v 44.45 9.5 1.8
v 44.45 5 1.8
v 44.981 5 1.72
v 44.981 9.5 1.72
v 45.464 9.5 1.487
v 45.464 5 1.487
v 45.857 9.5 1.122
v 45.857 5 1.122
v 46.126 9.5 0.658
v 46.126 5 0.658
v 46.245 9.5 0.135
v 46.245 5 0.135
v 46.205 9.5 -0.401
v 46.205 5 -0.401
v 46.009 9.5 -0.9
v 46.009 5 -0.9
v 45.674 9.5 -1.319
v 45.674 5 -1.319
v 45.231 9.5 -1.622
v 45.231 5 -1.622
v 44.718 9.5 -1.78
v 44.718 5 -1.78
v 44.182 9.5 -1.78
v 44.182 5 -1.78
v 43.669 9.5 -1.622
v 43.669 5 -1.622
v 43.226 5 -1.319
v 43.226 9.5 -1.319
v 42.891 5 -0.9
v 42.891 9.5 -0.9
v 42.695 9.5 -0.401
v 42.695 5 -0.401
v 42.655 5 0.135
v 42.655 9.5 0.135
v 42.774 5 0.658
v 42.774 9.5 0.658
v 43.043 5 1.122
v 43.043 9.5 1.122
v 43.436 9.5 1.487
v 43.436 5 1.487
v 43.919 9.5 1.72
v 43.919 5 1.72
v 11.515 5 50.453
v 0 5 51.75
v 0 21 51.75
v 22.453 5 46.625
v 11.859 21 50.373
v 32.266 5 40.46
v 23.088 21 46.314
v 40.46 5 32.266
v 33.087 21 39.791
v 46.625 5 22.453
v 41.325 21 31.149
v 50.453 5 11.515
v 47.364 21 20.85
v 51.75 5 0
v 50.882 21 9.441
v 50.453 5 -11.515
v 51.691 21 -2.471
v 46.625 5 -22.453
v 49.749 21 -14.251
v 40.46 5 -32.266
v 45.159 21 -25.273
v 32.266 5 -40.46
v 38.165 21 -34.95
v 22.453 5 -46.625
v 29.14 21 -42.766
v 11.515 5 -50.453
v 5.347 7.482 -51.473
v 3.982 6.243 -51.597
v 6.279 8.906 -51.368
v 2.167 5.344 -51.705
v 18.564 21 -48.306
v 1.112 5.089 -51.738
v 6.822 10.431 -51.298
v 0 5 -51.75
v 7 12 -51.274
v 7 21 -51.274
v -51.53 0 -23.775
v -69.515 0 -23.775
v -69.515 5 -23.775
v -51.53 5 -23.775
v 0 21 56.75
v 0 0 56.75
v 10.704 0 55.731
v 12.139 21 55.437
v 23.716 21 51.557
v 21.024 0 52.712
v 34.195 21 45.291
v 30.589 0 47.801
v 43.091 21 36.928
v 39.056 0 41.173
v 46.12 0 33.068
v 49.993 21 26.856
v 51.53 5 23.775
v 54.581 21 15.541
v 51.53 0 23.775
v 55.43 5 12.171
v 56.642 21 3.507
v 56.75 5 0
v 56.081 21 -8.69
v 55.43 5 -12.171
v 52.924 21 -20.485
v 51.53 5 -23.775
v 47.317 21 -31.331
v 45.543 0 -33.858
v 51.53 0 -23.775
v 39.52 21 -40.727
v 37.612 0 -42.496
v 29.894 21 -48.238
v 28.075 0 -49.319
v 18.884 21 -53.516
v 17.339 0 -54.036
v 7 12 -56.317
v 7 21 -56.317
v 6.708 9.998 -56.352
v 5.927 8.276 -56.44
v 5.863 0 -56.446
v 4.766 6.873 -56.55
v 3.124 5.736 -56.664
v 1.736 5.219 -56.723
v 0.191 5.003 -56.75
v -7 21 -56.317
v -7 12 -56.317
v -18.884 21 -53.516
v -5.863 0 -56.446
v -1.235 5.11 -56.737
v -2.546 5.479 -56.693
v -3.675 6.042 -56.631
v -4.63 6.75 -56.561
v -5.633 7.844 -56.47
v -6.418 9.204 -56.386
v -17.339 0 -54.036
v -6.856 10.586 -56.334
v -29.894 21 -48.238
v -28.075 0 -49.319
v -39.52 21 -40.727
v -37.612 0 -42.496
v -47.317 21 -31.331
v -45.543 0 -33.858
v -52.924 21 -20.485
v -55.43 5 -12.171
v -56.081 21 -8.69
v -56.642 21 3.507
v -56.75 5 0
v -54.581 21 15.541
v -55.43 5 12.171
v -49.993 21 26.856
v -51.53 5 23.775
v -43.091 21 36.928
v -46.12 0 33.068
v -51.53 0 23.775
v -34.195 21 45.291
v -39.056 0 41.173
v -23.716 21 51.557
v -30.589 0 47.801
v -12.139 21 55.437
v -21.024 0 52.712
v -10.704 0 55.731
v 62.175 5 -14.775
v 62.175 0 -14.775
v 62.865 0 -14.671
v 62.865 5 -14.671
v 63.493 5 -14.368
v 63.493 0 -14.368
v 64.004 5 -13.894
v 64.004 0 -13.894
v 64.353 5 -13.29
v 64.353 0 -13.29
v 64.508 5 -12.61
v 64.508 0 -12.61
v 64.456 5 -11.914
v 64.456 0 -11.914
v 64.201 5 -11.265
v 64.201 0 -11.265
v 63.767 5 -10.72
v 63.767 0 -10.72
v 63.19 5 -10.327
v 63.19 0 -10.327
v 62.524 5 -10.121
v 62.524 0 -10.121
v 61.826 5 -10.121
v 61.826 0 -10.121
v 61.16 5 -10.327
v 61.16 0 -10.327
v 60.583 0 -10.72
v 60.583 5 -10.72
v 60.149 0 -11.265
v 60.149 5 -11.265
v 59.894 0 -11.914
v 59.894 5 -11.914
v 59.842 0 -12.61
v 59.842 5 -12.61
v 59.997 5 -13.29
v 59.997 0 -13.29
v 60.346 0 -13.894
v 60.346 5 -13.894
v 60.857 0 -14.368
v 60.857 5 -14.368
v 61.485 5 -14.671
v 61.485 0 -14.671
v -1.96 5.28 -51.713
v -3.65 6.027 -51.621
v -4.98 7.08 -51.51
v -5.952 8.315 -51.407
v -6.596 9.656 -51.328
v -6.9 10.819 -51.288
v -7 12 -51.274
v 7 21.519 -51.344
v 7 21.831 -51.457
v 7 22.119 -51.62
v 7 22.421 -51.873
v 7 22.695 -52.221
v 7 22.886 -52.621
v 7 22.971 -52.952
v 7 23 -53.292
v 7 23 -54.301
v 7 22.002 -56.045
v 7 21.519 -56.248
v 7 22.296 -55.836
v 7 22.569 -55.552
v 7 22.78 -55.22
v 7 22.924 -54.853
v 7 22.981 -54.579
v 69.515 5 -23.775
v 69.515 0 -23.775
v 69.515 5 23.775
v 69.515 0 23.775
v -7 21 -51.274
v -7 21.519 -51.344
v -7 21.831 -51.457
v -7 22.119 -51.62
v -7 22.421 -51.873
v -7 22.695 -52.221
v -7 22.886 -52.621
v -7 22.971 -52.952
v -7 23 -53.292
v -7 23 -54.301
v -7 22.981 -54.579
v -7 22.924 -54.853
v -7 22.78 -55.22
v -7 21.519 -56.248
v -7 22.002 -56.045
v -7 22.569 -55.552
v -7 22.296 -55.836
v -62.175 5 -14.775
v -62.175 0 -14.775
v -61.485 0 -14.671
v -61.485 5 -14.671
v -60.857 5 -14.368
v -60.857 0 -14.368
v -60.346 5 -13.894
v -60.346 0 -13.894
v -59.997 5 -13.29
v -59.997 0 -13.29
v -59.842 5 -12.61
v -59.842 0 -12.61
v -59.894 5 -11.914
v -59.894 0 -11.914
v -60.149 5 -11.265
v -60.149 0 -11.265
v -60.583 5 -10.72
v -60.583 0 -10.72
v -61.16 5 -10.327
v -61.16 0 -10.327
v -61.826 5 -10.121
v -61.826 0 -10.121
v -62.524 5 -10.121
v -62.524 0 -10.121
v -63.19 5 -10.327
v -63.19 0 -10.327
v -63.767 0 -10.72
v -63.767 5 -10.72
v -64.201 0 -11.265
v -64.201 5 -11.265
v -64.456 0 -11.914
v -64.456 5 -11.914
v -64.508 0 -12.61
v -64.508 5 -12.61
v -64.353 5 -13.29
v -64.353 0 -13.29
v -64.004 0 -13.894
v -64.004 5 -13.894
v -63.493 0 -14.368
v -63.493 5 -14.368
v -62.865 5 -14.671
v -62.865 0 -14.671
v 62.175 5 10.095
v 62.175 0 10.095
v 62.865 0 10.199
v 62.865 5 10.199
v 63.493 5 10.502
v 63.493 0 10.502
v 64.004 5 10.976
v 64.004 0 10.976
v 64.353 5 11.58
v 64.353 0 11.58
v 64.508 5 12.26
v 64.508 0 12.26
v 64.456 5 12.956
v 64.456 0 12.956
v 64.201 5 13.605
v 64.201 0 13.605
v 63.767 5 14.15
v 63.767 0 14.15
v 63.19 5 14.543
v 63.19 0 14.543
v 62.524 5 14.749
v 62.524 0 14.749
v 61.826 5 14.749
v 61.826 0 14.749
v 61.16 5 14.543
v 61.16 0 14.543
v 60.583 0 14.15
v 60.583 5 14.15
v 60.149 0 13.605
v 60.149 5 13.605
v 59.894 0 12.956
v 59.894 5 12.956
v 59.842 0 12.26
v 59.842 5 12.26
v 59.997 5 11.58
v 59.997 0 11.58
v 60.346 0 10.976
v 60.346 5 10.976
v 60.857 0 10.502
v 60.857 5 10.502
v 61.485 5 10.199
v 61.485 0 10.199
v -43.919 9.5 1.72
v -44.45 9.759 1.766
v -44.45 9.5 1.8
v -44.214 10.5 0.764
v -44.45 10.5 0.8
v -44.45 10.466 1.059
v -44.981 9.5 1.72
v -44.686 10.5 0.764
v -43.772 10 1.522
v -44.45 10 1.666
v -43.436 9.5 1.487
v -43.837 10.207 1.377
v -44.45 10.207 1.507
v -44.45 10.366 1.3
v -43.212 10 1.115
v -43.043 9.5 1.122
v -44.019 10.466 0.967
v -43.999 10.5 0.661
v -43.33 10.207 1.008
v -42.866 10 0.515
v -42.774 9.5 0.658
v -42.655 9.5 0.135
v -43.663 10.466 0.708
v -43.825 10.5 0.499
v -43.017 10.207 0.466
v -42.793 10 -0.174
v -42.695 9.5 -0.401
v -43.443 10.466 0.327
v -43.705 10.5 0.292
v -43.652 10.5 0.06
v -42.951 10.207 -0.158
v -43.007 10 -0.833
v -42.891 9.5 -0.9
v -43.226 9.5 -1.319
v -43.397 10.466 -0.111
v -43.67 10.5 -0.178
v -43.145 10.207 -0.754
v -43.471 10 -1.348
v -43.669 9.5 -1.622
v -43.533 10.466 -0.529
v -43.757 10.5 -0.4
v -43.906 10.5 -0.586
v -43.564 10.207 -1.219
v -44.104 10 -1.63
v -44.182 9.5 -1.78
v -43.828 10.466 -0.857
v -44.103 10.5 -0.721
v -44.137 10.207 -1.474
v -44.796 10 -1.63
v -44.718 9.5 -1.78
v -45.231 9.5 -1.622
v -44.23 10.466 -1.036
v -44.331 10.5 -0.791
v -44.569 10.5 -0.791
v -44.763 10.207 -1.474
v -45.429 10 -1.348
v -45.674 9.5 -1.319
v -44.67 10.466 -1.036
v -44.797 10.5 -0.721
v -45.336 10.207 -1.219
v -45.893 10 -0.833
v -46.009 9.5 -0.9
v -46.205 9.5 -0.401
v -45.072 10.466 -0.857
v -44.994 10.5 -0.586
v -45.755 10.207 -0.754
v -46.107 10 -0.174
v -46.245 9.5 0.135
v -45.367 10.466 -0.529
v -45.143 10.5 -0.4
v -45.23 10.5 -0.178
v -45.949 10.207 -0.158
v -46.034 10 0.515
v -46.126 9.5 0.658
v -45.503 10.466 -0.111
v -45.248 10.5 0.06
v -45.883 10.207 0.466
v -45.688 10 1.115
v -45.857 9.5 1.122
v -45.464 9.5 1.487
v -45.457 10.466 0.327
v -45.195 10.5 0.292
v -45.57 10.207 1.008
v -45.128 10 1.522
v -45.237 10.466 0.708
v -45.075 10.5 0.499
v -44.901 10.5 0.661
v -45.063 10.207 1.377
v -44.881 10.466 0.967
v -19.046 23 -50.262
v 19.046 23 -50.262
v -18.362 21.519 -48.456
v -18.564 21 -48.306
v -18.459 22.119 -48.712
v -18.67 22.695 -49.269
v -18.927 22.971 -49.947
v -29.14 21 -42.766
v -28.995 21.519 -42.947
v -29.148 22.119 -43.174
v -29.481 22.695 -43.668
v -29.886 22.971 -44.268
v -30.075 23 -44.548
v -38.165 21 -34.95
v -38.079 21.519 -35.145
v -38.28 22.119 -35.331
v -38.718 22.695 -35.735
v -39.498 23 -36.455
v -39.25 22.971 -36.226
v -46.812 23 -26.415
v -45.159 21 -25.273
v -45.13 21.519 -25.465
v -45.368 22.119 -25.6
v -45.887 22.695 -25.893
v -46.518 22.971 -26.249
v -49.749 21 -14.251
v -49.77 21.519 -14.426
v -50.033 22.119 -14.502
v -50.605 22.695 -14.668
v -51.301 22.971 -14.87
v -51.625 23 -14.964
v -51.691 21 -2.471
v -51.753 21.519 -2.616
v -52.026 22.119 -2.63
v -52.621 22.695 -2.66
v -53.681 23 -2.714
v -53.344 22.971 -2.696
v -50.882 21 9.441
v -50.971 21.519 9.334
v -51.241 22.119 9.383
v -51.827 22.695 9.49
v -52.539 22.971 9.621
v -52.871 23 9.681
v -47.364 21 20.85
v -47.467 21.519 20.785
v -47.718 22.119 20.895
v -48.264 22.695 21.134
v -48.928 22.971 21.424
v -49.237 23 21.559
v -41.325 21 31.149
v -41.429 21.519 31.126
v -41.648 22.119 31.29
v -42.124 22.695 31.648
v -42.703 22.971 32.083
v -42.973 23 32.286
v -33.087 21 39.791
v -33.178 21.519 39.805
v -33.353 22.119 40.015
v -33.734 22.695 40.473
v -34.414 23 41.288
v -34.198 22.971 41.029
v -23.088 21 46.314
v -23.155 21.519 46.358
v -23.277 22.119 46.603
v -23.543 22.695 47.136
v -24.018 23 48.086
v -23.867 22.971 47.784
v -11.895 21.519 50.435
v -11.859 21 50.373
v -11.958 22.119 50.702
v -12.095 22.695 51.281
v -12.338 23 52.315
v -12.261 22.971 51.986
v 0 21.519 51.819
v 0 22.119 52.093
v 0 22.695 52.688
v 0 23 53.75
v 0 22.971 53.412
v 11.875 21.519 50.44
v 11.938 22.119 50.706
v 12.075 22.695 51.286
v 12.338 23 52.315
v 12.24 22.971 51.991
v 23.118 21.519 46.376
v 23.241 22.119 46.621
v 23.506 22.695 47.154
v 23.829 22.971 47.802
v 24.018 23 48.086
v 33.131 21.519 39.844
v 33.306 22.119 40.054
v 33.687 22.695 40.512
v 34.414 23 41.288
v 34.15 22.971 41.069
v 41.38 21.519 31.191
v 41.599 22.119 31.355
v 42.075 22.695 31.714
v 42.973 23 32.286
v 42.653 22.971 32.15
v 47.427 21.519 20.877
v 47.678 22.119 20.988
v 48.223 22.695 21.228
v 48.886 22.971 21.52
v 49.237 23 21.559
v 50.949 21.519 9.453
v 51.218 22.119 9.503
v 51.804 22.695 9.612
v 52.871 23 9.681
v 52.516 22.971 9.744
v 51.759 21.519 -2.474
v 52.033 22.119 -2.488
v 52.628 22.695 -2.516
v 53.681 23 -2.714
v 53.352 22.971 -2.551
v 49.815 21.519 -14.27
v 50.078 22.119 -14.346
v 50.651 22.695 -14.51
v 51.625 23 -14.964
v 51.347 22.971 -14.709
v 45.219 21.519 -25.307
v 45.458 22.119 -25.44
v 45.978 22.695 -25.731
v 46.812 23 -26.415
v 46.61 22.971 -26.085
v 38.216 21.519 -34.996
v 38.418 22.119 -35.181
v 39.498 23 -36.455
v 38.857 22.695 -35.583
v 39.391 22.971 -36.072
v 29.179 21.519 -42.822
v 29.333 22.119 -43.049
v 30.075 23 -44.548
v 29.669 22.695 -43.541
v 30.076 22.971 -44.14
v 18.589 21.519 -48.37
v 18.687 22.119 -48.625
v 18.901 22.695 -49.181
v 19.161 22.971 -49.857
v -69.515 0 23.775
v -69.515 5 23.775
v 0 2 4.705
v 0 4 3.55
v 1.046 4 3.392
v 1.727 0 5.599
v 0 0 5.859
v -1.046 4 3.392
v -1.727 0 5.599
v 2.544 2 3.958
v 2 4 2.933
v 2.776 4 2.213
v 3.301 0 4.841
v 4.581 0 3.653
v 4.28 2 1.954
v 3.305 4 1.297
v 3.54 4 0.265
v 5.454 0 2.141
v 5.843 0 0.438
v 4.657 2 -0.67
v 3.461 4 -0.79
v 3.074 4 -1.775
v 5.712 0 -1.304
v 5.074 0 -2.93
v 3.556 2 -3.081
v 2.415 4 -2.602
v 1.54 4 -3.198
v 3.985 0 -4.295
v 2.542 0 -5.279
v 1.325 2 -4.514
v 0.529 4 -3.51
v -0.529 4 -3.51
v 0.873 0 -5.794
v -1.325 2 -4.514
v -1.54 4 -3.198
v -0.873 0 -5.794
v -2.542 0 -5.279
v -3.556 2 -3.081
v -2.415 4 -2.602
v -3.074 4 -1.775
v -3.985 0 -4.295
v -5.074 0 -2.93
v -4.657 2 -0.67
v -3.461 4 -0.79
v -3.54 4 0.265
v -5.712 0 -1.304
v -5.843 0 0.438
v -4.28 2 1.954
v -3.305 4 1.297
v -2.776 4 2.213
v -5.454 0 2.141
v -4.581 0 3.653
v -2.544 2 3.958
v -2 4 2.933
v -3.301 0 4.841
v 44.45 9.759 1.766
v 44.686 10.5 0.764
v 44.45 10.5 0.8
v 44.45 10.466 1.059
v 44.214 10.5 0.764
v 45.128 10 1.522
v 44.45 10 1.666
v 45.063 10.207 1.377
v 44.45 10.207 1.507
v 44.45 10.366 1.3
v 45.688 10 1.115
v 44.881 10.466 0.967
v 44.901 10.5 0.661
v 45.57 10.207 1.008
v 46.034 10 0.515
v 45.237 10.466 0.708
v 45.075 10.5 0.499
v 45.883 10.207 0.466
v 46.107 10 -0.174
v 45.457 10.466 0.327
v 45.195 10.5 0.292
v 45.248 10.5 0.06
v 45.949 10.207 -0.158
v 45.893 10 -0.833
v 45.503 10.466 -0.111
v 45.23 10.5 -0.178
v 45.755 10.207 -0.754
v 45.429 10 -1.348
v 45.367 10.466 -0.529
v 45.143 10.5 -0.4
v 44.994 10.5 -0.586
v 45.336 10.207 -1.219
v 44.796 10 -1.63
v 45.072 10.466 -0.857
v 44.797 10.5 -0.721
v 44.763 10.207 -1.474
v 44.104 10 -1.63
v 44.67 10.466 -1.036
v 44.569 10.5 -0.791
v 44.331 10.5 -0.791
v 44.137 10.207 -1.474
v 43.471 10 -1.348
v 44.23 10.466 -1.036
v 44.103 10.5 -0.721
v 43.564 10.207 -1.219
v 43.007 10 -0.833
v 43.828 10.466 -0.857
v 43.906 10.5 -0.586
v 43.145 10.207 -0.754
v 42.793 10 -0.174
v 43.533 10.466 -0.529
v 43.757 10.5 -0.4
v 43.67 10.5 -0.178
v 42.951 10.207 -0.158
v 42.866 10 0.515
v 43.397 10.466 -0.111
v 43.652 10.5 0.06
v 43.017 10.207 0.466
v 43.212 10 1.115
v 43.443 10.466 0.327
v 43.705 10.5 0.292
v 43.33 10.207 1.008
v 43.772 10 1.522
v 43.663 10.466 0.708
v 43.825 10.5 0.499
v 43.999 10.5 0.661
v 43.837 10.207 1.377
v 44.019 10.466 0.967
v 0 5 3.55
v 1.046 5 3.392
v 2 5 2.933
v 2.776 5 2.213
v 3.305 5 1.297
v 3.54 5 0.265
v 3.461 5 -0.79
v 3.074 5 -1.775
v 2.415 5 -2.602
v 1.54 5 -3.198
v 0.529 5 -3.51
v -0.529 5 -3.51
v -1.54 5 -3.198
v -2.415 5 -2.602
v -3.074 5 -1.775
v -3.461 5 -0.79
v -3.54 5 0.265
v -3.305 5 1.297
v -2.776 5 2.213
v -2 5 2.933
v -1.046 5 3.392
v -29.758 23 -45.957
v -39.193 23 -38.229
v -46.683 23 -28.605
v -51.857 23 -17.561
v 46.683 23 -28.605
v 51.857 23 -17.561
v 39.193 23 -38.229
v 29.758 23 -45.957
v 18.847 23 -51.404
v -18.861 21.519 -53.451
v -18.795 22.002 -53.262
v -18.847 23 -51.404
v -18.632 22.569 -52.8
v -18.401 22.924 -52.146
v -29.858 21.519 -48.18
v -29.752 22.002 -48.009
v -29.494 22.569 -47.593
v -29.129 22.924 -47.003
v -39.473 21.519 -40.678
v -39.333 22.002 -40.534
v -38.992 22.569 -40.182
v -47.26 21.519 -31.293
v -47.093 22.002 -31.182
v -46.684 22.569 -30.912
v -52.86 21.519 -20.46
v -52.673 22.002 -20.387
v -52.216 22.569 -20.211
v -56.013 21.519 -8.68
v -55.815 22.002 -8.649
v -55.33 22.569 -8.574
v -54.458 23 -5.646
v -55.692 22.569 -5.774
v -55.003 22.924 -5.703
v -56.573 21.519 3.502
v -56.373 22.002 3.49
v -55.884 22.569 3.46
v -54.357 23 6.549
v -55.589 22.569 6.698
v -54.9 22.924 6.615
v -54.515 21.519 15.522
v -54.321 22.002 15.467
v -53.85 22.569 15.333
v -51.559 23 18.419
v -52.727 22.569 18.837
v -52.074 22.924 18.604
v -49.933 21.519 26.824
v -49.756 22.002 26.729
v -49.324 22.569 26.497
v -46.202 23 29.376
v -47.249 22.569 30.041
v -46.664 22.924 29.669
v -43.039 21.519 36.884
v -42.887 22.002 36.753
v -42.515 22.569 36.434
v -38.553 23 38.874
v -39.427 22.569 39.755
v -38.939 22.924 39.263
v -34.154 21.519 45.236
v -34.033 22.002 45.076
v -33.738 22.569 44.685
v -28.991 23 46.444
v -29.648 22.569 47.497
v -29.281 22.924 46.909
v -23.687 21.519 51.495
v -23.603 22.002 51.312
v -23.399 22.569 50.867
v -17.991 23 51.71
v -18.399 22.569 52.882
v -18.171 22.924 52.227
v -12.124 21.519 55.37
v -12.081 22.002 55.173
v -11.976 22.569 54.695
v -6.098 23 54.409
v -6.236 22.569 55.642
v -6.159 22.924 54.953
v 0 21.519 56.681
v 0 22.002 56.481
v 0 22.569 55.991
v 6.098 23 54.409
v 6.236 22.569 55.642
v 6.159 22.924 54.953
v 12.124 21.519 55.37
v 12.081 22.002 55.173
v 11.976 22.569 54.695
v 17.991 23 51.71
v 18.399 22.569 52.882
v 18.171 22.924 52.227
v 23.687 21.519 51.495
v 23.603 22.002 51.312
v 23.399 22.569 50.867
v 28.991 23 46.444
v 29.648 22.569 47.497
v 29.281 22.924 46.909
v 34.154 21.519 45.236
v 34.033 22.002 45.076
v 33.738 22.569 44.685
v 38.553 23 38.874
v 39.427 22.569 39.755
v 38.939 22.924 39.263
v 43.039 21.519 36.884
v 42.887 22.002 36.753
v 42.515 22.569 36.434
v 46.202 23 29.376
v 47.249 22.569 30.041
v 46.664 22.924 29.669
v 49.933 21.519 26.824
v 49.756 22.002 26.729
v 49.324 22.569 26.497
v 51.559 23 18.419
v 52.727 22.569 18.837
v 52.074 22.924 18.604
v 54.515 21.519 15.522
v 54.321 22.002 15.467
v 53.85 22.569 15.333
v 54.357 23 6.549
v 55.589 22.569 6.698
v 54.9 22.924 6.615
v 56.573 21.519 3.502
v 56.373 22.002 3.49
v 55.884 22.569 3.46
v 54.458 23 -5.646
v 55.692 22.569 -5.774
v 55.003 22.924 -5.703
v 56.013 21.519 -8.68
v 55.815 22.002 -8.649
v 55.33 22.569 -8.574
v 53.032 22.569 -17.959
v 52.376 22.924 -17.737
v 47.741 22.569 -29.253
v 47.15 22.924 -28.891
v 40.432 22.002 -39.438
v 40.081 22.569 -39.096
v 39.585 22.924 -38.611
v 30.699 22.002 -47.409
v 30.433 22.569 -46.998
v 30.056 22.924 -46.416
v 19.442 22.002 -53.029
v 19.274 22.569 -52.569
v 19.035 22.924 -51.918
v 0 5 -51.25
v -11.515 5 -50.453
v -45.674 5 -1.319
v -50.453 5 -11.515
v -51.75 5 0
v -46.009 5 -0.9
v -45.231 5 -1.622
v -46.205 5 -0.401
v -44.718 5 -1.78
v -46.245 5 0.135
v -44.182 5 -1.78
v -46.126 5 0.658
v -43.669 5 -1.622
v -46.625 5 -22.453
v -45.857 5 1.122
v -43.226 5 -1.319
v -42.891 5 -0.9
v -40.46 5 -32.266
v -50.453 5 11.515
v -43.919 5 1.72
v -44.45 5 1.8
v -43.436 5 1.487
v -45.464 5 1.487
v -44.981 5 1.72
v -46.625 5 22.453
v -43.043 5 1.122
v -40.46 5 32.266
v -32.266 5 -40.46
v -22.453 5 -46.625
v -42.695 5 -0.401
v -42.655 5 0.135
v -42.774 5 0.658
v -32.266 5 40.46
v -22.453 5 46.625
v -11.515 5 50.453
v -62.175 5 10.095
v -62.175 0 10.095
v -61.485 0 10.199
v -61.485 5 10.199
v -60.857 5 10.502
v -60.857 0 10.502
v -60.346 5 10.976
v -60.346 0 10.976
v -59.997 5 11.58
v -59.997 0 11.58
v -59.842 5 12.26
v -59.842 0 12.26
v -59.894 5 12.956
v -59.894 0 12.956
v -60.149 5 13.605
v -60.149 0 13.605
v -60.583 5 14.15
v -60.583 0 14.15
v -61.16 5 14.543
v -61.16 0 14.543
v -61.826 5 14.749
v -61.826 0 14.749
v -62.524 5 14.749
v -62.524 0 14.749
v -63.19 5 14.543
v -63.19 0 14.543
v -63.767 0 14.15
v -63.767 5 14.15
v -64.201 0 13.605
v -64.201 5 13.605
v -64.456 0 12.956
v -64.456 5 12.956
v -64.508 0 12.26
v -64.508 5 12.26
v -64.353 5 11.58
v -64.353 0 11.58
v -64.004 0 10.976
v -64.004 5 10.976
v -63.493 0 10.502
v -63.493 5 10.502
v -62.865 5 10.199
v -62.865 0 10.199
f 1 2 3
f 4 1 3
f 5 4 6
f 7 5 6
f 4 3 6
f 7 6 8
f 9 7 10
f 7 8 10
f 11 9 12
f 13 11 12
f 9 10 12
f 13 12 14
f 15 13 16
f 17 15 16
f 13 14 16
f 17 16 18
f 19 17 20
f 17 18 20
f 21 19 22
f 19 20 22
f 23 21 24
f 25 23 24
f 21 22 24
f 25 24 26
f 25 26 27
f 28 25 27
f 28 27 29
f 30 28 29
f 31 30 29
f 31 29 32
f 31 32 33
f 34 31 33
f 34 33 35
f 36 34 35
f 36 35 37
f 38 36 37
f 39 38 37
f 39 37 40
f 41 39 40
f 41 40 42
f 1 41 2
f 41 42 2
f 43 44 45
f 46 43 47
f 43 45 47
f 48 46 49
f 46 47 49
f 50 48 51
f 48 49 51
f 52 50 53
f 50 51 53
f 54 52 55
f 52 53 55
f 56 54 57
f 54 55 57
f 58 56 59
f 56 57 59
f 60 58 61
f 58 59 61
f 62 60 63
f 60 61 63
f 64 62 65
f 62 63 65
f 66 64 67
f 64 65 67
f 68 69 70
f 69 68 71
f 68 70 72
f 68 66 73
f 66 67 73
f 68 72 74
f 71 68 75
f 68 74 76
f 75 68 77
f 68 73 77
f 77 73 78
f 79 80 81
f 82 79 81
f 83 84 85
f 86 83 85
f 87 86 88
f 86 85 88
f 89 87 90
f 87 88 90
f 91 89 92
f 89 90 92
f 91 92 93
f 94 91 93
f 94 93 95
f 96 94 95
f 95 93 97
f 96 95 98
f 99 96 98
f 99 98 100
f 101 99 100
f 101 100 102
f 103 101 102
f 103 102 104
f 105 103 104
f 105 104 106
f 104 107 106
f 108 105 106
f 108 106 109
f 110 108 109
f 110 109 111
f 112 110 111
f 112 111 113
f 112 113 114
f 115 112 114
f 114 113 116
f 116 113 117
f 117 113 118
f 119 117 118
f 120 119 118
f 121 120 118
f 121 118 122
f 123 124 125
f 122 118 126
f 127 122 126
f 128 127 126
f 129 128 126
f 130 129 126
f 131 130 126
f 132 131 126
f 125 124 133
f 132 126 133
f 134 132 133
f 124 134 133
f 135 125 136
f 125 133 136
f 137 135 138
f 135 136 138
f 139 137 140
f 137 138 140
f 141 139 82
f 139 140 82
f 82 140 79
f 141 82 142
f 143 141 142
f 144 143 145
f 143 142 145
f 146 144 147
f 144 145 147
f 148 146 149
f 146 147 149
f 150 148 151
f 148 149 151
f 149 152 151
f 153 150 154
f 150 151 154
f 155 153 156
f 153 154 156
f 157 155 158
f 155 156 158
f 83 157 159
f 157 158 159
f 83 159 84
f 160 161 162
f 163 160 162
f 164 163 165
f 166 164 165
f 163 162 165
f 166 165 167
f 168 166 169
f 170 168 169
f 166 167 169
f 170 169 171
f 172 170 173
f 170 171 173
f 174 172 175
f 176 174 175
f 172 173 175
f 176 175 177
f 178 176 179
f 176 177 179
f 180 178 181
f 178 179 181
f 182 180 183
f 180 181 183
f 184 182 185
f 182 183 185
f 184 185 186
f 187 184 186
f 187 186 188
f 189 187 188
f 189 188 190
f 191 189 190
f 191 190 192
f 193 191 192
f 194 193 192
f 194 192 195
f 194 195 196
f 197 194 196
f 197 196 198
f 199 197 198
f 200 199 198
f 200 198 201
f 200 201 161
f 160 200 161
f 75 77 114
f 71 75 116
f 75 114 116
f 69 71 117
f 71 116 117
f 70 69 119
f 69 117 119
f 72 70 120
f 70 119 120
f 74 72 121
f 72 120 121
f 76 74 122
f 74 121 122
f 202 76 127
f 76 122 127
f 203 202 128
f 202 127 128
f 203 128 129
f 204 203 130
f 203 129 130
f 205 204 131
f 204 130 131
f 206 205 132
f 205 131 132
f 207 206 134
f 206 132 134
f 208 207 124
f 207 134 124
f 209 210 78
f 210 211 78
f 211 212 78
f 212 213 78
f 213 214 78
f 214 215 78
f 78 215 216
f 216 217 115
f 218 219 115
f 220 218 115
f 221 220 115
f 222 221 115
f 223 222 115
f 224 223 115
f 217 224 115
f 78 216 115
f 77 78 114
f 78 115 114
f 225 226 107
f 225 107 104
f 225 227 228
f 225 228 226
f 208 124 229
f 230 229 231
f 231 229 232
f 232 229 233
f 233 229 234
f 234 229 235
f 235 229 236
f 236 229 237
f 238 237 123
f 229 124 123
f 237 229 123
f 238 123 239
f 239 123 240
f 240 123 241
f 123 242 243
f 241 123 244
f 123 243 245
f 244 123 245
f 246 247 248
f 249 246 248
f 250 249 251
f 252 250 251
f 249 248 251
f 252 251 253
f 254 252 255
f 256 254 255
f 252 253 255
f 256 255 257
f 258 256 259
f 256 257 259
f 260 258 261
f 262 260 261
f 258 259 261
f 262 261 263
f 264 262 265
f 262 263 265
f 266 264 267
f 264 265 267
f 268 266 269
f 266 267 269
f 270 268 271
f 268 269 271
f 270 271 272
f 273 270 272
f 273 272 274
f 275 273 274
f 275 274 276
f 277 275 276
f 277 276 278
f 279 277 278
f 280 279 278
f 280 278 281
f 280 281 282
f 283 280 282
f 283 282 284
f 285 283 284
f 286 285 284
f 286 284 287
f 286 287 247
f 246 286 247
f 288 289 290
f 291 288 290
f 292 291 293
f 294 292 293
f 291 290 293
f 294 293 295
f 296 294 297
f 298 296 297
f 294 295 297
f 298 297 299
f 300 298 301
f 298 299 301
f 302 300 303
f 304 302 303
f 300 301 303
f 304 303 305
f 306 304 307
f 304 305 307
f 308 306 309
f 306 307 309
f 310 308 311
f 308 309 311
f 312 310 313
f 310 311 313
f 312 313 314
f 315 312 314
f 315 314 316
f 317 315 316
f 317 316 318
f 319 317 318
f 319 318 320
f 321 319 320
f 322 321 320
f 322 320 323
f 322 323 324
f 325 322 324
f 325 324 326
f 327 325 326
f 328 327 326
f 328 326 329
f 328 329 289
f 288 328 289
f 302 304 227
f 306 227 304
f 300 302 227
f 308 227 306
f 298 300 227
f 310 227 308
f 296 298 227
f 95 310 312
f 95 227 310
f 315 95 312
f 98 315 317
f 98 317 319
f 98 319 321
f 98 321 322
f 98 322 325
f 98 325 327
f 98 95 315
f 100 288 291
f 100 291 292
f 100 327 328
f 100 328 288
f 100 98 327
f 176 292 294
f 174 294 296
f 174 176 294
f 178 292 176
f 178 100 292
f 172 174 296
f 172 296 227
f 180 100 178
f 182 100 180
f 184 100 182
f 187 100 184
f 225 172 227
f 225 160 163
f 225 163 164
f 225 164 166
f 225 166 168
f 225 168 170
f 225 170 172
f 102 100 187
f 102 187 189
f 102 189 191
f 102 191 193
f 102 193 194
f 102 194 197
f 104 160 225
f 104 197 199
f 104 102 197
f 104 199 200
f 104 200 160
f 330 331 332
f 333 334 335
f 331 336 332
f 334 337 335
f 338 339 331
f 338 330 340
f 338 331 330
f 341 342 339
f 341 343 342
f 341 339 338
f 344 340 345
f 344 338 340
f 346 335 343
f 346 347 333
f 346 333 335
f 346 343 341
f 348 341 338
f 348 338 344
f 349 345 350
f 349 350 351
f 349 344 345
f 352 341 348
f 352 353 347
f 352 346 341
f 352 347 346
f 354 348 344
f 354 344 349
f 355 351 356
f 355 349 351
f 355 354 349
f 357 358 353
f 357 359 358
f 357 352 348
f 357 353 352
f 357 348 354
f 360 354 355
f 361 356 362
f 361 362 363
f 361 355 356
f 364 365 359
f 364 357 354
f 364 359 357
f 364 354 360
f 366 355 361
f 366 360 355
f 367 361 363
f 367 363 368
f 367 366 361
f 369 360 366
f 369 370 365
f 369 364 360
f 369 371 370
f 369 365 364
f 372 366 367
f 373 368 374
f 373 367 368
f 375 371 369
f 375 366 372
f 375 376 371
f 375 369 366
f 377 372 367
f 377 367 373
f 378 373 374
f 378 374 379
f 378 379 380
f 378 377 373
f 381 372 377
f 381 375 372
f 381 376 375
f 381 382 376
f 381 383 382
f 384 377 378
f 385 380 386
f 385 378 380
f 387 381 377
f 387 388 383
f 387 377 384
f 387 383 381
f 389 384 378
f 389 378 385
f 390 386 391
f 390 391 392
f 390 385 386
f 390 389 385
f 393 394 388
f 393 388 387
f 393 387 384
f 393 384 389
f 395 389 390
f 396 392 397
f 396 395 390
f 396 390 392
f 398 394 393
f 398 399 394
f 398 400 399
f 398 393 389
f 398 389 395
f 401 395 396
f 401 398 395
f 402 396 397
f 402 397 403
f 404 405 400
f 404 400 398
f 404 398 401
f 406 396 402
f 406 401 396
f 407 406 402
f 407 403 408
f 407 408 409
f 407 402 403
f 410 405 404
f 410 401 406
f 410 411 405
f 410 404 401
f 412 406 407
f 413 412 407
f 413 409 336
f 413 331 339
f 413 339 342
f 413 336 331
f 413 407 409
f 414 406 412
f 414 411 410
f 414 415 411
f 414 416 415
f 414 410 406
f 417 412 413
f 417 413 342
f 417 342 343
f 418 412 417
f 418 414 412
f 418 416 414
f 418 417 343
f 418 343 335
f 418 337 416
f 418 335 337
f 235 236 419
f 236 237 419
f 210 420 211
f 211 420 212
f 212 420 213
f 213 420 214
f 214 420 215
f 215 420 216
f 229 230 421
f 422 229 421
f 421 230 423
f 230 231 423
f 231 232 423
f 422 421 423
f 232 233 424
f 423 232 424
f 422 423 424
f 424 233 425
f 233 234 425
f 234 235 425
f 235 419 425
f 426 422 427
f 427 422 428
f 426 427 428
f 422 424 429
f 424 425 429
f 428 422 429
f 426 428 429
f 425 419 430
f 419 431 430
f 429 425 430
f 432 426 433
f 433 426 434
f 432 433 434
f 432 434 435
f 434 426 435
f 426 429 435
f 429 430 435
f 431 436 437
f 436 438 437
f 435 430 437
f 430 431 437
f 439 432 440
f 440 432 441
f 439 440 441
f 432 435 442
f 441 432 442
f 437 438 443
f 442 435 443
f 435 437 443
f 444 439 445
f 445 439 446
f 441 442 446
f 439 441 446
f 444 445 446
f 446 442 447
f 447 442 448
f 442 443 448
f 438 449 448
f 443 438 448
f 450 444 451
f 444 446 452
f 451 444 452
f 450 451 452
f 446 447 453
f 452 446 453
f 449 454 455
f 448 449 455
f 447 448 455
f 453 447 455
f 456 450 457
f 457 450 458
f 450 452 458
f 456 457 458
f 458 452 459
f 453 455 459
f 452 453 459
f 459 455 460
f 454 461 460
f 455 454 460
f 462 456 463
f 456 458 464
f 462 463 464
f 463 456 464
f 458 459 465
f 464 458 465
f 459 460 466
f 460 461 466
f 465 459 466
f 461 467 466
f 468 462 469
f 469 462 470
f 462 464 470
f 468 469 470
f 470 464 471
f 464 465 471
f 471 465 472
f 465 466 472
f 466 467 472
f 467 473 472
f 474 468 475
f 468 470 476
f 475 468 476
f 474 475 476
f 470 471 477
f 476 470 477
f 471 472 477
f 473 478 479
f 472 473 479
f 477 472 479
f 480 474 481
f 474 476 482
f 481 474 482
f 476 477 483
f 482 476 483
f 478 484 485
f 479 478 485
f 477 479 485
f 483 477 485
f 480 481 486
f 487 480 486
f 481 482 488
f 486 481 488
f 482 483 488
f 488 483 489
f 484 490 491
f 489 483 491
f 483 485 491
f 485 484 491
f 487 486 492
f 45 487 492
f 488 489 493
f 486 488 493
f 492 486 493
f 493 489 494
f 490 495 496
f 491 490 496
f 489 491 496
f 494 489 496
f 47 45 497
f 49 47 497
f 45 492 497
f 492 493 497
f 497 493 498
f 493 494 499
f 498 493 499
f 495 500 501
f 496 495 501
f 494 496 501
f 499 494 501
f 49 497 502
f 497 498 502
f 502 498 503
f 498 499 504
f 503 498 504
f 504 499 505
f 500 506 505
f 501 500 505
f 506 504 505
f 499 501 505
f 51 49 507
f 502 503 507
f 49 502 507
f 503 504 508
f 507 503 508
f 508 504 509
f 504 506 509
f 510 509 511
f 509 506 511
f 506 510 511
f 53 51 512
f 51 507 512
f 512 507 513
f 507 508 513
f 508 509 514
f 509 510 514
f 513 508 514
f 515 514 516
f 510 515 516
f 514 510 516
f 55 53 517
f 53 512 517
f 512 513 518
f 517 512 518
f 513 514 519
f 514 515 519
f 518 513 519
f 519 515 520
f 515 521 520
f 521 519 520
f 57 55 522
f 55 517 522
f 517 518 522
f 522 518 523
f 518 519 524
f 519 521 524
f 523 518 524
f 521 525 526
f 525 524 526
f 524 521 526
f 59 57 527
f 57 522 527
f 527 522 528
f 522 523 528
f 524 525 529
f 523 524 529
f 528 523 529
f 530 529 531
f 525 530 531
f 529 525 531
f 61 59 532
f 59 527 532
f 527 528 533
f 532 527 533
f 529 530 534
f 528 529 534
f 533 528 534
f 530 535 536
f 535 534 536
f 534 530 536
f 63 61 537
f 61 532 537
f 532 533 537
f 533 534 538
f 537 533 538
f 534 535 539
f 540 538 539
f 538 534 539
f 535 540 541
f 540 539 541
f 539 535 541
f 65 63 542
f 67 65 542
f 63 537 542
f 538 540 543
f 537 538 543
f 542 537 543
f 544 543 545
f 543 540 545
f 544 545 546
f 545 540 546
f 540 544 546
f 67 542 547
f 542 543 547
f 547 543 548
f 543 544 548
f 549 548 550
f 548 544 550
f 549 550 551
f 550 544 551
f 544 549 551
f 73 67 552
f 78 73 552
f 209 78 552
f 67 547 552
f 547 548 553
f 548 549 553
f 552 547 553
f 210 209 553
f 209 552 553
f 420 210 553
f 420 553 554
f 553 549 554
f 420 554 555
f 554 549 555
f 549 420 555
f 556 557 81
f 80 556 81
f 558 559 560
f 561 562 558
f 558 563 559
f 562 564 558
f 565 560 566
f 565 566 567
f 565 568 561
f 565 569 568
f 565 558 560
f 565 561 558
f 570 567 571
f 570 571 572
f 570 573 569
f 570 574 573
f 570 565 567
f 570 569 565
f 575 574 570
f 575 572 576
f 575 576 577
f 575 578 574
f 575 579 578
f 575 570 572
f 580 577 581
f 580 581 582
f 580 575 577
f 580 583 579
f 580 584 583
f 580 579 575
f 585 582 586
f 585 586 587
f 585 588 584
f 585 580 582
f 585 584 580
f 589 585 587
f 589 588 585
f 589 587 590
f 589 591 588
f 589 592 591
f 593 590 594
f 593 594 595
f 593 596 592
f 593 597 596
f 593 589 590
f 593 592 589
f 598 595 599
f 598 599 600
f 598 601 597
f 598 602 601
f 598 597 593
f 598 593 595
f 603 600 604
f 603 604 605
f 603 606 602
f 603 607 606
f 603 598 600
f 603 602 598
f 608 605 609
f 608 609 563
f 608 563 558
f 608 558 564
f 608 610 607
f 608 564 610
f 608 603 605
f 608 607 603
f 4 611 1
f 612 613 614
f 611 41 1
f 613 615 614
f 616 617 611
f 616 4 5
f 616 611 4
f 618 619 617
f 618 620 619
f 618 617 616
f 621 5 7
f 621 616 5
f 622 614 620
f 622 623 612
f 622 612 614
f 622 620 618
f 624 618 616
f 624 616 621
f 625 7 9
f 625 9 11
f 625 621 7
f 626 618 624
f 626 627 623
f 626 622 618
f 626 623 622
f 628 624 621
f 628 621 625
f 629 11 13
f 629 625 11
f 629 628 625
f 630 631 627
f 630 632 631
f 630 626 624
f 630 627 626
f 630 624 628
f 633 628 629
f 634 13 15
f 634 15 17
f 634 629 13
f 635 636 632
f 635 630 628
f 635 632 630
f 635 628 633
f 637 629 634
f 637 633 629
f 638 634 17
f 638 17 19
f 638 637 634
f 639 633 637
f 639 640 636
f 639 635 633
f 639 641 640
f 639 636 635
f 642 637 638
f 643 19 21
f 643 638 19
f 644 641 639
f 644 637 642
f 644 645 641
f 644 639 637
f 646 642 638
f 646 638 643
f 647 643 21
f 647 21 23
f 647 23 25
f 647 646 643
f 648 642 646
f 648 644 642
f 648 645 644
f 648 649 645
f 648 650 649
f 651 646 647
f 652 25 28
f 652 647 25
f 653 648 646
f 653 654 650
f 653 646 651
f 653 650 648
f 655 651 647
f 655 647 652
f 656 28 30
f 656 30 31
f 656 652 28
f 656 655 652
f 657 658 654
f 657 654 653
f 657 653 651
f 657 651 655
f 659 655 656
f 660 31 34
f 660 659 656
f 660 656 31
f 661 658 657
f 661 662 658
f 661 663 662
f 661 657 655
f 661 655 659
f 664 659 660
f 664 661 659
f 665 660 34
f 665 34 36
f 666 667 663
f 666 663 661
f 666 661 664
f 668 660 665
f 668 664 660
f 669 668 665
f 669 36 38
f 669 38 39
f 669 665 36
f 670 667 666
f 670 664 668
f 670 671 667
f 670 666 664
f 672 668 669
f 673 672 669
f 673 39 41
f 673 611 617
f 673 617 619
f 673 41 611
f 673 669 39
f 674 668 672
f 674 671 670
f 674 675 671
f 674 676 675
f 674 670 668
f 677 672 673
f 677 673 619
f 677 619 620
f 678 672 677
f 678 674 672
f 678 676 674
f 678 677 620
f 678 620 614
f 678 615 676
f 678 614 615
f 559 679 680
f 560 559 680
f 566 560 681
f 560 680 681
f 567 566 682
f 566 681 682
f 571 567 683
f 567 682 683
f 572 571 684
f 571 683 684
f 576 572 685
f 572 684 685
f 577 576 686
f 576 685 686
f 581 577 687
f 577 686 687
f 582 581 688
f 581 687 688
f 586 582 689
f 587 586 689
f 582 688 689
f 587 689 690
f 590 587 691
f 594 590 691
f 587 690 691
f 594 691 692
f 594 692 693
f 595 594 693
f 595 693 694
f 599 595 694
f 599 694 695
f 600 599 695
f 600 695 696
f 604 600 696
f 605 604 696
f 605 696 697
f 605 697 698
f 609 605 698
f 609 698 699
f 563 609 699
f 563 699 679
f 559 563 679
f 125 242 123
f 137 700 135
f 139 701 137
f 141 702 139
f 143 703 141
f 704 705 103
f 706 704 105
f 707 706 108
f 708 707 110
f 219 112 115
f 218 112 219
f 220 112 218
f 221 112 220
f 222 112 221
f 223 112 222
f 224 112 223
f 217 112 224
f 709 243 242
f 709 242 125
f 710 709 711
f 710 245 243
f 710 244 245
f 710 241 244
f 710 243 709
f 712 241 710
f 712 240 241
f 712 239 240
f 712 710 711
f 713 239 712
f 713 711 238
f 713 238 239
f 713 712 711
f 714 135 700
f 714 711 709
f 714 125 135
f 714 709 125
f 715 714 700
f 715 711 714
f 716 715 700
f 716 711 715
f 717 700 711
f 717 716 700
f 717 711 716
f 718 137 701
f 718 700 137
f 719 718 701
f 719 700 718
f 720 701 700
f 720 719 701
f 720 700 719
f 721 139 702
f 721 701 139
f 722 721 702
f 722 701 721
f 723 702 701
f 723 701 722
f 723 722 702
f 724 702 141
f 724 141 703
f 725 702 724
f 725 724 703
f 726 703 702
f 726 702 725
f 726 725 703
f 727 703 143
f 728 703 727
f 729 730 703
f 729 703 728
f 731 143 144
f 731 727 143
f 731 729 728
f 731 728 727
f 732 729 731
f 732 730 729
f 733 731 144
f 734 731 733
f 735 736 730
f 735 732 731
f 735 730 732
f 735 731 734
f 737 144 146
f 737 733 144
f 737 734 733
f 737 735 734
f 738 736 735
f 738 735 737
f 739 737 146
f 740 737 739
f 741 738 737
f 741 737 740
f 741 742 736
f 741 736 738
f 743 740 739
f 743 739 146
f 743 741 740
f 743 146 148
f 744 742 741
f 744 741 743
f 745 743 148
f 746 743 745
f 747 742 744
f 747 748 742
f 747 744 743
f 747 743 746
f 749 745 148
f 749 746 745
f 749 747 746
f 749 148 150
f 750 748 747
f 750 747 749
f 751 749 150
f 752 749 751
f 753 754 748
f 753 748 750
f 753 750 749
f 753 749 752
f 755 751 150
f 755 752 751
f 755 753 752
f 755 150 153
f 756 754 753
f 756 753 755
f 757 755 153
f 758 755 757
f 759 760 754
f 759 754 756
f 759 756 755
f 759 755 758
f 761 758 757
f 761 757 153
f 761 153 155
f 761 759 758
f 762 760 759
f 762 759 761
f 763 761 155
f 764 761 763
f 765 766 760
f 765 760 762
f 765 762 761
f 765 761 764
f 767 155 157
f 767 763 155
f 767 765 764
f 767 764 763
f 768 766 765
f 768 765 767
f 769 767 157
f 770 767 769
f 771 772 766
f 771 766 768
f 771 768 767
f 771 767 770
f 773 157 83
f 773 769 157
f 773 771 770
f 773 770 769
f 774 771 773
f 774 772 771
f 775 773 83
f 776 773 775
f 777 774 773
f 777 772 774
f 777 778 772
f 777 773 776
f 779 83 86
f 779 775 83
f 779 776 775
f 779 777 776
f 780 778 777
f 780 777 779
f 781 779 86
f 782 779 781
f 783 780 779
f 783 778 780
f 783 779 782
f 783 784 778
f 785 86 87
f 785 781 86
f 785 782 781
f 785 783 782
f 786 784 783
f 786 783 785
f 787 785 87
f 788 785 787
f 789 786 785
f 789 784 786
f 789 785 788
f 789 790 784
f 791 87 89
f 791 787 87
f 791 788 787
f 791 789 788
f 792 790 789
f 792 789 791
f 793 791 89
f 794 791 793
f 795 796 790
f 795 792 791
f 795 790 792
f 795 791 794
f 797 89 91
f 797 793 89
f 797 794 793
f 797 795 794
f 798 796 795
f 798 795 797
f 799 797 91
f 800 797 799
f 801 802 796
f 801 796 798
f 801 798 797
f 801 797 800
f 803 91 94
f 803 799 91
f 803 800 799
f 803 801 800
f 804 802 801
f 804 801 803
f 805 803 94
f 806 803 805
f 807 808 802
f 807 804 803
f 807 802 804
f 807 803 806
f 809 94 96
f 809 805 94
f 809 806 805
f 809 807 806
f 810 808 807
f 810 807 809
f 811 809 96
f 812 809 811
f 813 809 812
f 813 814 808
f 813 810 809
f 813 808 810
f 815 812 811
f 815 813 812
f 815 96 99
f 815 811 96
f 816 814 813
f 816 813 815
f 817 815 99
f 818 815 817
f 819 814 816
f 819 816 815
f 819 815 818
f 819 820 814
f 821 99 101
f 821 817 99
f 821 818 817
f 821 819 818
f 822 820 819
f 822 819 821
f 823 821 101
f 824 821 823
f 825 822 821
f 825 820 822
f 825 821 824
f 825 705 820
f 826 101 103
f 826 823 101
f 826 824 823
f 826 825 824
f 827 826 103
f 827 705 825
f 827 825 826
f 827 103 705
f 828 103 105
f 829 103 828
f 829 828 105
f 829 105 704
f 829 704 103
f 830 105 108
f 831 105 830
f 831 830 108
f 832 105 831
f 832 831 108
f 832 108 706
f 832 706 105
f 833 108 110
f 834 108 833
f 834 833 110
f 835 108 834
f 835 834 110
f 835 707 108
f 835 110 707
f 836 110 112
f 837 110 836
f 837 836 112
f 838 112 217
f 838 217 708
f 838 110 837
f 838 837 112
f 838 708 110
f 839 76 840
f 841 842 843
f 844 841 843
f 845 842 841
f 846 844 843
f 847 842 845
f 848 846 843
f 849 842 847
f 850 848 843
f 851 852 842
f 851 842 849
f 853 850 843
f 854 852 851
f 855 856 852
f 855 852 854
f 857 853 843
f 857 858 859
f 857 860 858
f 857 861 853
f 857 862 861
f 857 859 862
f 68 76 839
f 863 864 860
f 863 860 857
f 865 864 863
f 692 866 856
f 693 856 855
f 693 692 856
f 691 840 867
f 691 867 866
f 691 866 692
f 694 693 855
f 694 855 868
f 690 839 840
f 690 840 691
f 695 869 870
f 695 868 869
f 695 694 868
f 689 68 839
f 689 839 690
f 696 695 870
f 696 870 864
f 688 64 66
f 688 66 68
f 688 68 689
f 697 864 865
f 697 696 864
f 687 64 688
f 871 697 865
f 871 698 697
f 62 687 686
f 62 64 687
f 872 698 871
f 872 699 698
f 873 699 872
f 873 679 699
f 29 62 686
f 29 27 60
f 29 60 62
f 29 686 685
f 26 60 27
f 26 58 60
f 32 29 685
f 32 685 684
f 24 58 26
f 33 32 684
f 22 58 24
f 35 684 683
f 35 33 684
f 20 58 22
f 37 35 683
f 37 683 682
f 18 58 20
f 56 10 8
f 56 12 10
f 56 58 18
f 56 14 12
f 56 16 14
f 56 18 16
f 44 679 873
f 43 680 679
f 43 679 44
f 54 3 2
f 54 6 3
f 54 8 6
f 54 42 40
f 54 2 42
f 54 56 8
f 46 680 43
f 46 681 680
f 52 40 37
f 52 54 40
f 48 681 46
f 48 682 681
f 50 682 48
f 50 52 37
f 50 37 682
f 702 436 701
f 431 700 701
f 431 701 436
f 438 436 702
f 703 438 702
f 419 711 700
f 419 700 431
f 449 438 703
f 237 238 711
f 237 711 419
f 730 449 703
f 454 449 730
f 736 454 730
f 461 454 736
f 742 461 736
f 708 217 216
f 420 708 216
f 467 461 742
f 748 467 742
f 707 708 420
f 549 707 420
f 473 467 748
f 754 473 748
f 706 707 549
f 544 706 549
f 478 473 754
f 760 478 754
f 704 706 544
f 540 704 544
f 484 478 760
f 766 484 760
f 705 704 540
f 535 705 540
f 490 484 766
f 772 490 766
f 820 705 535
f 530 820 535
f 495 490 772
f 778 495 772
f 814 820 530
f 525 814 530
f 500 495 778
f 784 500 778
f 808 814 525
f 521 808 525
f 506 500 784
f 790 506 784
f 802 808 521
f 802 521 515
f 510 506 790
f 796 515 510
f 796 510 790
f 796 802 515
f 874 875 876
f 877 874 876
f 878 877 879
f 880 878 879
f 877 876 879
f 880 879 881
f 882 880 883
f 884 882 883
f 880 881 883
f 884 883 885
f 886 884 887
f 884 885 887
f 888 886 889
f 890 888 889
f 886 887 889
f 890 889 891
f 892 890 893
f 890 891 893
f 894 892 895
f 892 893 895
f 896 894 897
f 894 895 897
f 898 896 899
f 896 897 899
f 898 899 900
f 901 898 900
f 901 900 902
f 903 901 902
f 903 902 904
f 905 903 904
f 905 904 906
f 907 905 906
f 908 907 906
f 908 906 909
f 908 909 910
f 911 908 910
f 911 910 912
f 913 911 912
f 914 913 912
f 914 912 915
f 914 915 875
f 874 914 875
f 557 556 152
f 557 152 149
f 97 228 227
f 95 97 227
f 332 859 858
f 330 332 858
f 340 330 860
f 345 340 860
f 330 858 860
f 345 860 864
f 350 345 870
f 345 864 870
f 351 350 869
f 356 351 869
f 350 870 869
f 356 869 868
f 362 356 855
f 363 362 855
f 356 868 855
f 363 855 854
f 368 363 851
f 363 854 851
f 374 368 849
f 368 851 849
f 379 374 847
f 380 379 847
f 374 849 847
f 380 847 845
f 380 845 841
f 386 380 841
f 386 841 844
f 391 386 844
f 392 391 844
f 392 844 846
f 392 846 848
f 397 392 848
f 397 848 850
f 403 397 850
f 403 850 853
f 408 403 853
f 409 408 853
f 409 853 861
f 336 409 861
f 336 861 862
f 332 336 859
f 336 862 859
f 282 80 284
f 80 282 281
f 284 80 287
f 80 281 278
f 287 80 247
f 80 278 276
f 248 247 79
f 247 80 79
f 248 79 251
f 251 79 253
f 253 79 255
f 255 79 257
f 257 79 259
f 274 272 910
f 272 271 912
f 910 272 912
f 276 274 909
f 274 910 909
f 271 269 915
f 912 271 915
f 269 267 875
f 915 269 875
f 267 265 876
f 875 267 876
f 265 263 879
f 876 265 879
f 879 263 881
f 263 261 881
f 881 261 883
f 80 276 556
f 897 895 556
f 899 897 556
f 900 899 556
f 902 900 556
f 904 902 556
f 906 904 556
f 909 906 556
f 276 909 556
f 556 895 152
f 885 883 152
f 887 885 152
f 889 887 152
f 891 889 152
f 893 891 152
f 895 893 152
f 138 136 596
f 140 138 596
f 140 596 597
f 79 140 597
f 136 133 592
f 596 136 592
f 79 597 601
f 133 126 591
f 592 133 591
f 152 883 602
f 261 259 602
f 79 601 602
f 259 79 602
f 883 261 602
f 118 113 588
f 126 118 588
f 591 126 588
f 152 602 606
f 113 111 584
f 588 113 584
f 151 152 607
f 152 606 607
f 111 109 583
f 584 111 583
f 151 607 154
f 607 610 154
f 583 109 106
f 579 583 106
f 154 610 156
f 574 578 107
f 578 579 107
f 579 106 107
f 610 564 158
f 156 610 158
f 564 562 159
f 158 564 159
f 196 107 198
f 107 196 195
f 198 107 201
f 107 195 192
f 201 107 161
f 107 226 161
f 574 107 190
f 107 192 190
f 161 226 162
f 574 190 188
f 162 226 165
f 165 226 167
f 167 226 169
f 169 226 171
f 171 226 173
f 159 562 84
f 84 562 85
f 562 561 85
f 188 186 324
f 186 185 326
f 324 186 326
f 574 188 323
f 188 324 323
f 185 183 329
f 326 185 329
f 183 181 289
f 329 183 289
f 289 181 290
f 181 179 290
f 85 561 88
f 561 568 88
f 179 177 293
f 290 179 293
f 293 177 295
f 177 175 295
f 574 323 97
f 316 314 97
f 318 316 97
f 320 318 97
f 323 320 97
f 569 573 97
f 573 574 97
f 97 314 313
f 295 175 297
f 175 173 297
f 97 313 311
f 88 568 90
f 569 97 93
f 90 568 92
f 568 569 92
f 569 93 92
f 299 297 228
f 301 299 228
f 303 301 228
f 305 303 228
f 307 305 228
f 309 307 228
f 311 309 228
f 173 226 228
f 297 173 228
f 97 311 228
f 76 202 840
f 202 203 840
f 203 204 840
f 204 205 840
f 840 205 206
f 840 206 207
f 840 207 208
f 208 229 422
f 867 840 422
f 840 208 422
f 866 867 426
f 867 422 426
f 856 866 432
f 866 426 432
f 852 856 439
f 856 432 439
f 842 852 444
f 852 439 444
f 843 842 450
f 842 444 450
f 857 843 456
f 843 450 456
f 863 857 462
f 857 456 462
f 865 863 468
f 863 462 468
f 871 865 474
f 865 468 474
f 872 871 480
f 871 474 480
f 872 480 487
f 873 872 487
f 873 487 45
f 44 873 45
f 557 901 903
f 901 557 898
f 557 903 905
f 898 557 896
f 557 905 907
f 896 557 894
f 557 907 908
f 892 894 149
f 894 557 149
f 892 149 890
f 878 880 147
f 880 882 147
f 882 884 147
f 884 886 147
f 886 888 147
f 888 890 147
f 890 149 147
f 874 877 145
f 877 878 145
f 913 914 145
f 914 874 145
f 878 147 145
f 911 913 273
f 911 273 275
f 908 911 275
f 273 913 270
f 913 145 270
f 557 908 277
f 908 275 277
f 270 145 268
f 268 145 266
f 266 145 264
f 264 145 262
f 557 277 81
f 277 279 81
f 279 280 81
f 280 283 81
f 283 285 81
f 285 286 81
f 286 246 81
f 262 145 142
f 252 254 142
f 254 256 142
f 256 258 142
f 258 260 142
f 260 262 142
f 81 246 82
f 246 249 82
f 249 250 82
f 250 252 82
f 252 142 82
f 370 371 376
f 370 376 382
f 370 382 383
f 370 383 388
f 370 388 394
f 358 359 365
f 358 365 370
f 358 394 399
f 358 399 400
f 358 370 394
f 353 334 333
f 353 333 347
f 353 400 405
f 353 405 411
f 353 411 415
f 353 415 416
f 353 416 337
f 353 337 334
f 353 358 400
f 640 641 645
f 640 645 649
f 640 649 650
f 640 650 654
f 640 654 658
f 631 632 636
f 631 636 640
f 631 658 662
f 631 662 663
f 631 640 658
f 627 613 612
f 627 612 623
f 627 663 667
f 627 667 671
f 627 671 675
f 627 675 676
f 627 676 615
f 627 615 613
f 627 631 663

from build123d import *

# Parameters (mm, degrees)
SKETCH1_R               = 56.75
BOSS_EXTRUDE3_DEPTH     = 23
SKETCH10_R              = 51.75
CUT_EXTRUDE3_DEPTH      = 18
SKETCH12_R              = 3.55
CUT_EXTRUDE4_DEPTH      = 83.250379938
SKETCH17_R              = 1.8
BOSS_EXTRUDE4_DEPTH     = 5.5
SKETCH18_R              = 1.8
BOSS_EXTRUDE5_DEPTH     = 5.5
FILLET5_R               = 1
FILLET6_R               = 1
CUT_EXTRUDE5_DEPTH      = 3
CUT_EXTRUDE5_DEPTH_BACK = 3
FILLET7_R               = 2
FILLET8_R               = 2
CHAMFER1_SIZE           = 4
CHAMFER1_SIZE2          = 2.309401077
SKETCH34_W              = 47.55
SKETCH34_H              = 5
BOSS_EXTRUDE6_DEPTH     = 29.515
SKETCH35_W              = 47.55
SKETCH35_H              = 5
BOSS_EXTRUDE7_DEPTH     = 29.515
CUT_EXTRUDE6_REACH      = 94.639
SKETCH42_R              = 2.34
CUT_EXTRUDE7_REACH      = 94.639
SKETCH43_R              = 2.34
CUT_EXTRUDE8_REACH      = 94.639
SKETCH44_R              = 2.34
CUT_EXTRUDE9_REACH      = 94.639
SKETCH45_R              = 2.34


with BuildPart() as part:
    # Sketch1 → Boss-Extrude3 (new body)
    with BuildSketch(Plane(origin=(0, 0, 0), x_dir=(1, 0, 0), z_dir=(0, 1, 0))):
        Circle(SKETCH1_R)
    extrude(amount=BOSS_EXTRUDE3_DEPTH)

    # Sketch10 → Cut-Extrude3 (cut)
    with BuildSketch(Plane(origin=(0, 23, 0), x_dir=(1, 0, 0), z_dir=(0, 1, 0))):
        Circle(SKETCH10_R)
    extrude(amount=-CUT_EXTRUDE3_DEPTH, mode=Mode.SUBTRACT)

    # Sketch12 → Cut-Extrude4 (cut, through all)
    with BuildSketch(Plane(origin=(0, 5, 0), x_dir=(1, 0, 0), z_dir=(0, 1, 0))):
        Circle(SKETCH12_R)
    extrude(amount=-CUT_EXTRUDE4_DEPTH, mode=Mode.SUBTRACT)

    # Sketch17 → Boss-Extrude4 (add)
    with BuildSketch(Plane(origin=(0, 5, 0), x_dir=(1, 0, 0), z_dir=(0, 1, 0))):
        with Locations((-44.45, 0)):
            Circle(SKETCH17_R)
    extrude(amount=BOSS_EXTRUDE4_DEPTH)

    # Sketch18 → Boss-Extrude5 (add)
    with BuildSketch(Plane(origin=(0, 5, 0), x_dir=(1, 0, 0), z_dir=(0, 1, 0))):
        with Locations((44.45, 0)):
            Circle(SKETCH18_R)
    extrude(amount=BOSS_EXTRUDE5_DEPTH)

    # Fillet5
    fillet5_edges = [part.edges().sort_by_distance(p)[0] for p in [
        (-46.25, 10.5, 0),
    ]]
    fillet(fillet5_edges, radius=FILLET5_R)

    # Fillet6
    fillet6_edges = [part.edges().sort_by_distance(p)[0] for p in [
        (42.65, 10.5, 0),
    ]]
    fillet(fillet6_edges, radius=FILLET6_R)

    # Sketch27 → Cut-Extrude5 (cut, two sides: drawn at the far end of the back side and taken through both)
    with BuildSketch(Plane.XY.offset(-54.25).offset(-CUT_EXTRUDE5_DEPTH_BACK)):
        with BuildLine():
            Line((7, 23), (7, 12))
            ThreePointArc((7, 12), (0, 5), (-7, 12))
            Line((-7, 12), (-7, 23))
            ThreePointArc((-7, 23), (0, 30), (7, 23))
        make_face()
    extrude(amount=CUT_EXTRUDE5_DEPTH + CUT_EXTRUDE5_DEPTH_BACK, mode=Mode.SUBTRACT)

    # Fillet7
    fillet7_edges = [part.edges().sort_by_distance(p)[0] for p in [
        (-34.028021541, 23, 38.989181192),
    ]]
    fillet(fillet7_edges, radius=FILLET7_R)

    # Fillet8
    fillet8_edges = [part.edges().sort_by_distance(p)[0] for p in [
        (-37.572014186, 23, 42.531238519),
    ]]
    fillet(fillet8_edges, radius=FILLET8_R)

    # Chamfer1
    chamfer1_edges = [part.edges().sort_by_distance(p)[0] for p in [
        (-3.55, 0, 0),
    ]]
    chamfer1_side = [part.faces().sort_by_distance(p)[0] for p in [
        (-3.55, 2.5, 0),
    ]]
    chamfer(chamfer1_edges, length=CHAMFER1_SIZE, length2=CHAMFER1_SIZE2, reference=chamfer1_side[0])

    # Sketch34 → Boss-Extrude6 (add)
    with BuildSketch(Plane(origin=(-40, 0, 0), x_dir=(0, 0, -1), z_dir=(1, 0, 0))):
        with Locations((0, 2.5)):
            Rectangle(SKETCH34_W, SKETCH34_H)
    extrude(amount=-BOSS_EXTRUDE6_DEPTH)

    # Sketch35 → Boss-Extrude7 (add)
    with BuildSketch(Plane(origin=(40, 0, 0), x_dir=(0, 0, -1), z_dir=(1, 0, 0))):
        with Locations((0, 2.5)):
            Rectangle(SKETCH35_W, SKETCH35_H)
    extrude(amount=BOSS_EXTRUDE7_DEPTH)

    # Sketch42 → Cut-Extrude6 (cut, up to next)
    with BuildSketch(Plane.XZ, mode=Mode.PRIVATE) as cut_extrude6_sk1:
        with Locations((62.175, -12.435)):
            Circle(SKETCH42_R)
    cut_extrude6_tool1 = extrude(cut_extrude6_sk1.sketch, amount=-CUT_EXTRUDE6_REACH, mode=Mode.PRIVATE) & part.part
    add(cut_extrude6_tool1.solids().sort_by_distance((62.175, 0, -12.435))[0], mode=Mode.SUBTRACT)

    # Sketch43 → Cut-Extrude7 (cut, up to next)
    with BuildSketch(Plane(origin=(0, 0, 0), x_dir=(-1, 0, 0), z_dir=(0, -1, 0)), mode=Mode.PRIVATE) as cut_extrude7_sk1:
        with Locations((-62.175, -12.435)):
            Circle(SKETCH43_R)
    cut_extrude7_tool1 = extrude(cut_extrude7_sk1.sketch, amount=-CUT_EXTRUDE7_REACH, mode=Mode.PRIVATE) & part.part
    add(cut_extrude7_tool1.solids().sort_by_distance((62.175, 0, 12.435))[0], mode=Mode.SUBTRACT)

    # Sketch44 → Cut-Extrude8 (cut, up to next)
    with BuildSketch(Plane(origin=(0, 0, 0), x_dir=(-1, 0, 0), z_dir=(0, -1, 0)), mode=Mode.PRIVATE) as cut_extrude8_sk1:
        with Locations((62.175, 12.435)):
            Circle(SKETCH44_R)
    cut_extrude8_tool1 = extrude(cut_extrude8_sk1.sketch, amount=-CUT_EXTRUDE8_REACH, mode=Mode.PRIVATE) & part.part
    add(cut_extrude8_tool1.solids().sort_by_distance((-62.175, 0, -12.435))[0], mode=Mode.SUBTRACT)

    # Sketch45 → Cut-Extrude9 (cut, up to next)
    with BuildSketch(Plane(origin=(0, 0, 0), x_dir=(-1, 0, 0), z_dir=(0, -1, 0)), mode=Mode.PRIVATE) as cut_extrude9_sk1:
        with Locations((62.175, -12.435)):
            Circle(SKETCH45_R)
    cut_extrude9_tool1 = extrude(cut_extrude9_sk1.sketch, amount=-CUT_EXTRUDE9_REACH, mode=Mode.PRIVATE) & part.part
    add(cut_extrude9_tool1.solids().sort_by_distance((-62.175, 0, 12.435))[0], mode=Mode.SUBTRACT)


solid = part.part
